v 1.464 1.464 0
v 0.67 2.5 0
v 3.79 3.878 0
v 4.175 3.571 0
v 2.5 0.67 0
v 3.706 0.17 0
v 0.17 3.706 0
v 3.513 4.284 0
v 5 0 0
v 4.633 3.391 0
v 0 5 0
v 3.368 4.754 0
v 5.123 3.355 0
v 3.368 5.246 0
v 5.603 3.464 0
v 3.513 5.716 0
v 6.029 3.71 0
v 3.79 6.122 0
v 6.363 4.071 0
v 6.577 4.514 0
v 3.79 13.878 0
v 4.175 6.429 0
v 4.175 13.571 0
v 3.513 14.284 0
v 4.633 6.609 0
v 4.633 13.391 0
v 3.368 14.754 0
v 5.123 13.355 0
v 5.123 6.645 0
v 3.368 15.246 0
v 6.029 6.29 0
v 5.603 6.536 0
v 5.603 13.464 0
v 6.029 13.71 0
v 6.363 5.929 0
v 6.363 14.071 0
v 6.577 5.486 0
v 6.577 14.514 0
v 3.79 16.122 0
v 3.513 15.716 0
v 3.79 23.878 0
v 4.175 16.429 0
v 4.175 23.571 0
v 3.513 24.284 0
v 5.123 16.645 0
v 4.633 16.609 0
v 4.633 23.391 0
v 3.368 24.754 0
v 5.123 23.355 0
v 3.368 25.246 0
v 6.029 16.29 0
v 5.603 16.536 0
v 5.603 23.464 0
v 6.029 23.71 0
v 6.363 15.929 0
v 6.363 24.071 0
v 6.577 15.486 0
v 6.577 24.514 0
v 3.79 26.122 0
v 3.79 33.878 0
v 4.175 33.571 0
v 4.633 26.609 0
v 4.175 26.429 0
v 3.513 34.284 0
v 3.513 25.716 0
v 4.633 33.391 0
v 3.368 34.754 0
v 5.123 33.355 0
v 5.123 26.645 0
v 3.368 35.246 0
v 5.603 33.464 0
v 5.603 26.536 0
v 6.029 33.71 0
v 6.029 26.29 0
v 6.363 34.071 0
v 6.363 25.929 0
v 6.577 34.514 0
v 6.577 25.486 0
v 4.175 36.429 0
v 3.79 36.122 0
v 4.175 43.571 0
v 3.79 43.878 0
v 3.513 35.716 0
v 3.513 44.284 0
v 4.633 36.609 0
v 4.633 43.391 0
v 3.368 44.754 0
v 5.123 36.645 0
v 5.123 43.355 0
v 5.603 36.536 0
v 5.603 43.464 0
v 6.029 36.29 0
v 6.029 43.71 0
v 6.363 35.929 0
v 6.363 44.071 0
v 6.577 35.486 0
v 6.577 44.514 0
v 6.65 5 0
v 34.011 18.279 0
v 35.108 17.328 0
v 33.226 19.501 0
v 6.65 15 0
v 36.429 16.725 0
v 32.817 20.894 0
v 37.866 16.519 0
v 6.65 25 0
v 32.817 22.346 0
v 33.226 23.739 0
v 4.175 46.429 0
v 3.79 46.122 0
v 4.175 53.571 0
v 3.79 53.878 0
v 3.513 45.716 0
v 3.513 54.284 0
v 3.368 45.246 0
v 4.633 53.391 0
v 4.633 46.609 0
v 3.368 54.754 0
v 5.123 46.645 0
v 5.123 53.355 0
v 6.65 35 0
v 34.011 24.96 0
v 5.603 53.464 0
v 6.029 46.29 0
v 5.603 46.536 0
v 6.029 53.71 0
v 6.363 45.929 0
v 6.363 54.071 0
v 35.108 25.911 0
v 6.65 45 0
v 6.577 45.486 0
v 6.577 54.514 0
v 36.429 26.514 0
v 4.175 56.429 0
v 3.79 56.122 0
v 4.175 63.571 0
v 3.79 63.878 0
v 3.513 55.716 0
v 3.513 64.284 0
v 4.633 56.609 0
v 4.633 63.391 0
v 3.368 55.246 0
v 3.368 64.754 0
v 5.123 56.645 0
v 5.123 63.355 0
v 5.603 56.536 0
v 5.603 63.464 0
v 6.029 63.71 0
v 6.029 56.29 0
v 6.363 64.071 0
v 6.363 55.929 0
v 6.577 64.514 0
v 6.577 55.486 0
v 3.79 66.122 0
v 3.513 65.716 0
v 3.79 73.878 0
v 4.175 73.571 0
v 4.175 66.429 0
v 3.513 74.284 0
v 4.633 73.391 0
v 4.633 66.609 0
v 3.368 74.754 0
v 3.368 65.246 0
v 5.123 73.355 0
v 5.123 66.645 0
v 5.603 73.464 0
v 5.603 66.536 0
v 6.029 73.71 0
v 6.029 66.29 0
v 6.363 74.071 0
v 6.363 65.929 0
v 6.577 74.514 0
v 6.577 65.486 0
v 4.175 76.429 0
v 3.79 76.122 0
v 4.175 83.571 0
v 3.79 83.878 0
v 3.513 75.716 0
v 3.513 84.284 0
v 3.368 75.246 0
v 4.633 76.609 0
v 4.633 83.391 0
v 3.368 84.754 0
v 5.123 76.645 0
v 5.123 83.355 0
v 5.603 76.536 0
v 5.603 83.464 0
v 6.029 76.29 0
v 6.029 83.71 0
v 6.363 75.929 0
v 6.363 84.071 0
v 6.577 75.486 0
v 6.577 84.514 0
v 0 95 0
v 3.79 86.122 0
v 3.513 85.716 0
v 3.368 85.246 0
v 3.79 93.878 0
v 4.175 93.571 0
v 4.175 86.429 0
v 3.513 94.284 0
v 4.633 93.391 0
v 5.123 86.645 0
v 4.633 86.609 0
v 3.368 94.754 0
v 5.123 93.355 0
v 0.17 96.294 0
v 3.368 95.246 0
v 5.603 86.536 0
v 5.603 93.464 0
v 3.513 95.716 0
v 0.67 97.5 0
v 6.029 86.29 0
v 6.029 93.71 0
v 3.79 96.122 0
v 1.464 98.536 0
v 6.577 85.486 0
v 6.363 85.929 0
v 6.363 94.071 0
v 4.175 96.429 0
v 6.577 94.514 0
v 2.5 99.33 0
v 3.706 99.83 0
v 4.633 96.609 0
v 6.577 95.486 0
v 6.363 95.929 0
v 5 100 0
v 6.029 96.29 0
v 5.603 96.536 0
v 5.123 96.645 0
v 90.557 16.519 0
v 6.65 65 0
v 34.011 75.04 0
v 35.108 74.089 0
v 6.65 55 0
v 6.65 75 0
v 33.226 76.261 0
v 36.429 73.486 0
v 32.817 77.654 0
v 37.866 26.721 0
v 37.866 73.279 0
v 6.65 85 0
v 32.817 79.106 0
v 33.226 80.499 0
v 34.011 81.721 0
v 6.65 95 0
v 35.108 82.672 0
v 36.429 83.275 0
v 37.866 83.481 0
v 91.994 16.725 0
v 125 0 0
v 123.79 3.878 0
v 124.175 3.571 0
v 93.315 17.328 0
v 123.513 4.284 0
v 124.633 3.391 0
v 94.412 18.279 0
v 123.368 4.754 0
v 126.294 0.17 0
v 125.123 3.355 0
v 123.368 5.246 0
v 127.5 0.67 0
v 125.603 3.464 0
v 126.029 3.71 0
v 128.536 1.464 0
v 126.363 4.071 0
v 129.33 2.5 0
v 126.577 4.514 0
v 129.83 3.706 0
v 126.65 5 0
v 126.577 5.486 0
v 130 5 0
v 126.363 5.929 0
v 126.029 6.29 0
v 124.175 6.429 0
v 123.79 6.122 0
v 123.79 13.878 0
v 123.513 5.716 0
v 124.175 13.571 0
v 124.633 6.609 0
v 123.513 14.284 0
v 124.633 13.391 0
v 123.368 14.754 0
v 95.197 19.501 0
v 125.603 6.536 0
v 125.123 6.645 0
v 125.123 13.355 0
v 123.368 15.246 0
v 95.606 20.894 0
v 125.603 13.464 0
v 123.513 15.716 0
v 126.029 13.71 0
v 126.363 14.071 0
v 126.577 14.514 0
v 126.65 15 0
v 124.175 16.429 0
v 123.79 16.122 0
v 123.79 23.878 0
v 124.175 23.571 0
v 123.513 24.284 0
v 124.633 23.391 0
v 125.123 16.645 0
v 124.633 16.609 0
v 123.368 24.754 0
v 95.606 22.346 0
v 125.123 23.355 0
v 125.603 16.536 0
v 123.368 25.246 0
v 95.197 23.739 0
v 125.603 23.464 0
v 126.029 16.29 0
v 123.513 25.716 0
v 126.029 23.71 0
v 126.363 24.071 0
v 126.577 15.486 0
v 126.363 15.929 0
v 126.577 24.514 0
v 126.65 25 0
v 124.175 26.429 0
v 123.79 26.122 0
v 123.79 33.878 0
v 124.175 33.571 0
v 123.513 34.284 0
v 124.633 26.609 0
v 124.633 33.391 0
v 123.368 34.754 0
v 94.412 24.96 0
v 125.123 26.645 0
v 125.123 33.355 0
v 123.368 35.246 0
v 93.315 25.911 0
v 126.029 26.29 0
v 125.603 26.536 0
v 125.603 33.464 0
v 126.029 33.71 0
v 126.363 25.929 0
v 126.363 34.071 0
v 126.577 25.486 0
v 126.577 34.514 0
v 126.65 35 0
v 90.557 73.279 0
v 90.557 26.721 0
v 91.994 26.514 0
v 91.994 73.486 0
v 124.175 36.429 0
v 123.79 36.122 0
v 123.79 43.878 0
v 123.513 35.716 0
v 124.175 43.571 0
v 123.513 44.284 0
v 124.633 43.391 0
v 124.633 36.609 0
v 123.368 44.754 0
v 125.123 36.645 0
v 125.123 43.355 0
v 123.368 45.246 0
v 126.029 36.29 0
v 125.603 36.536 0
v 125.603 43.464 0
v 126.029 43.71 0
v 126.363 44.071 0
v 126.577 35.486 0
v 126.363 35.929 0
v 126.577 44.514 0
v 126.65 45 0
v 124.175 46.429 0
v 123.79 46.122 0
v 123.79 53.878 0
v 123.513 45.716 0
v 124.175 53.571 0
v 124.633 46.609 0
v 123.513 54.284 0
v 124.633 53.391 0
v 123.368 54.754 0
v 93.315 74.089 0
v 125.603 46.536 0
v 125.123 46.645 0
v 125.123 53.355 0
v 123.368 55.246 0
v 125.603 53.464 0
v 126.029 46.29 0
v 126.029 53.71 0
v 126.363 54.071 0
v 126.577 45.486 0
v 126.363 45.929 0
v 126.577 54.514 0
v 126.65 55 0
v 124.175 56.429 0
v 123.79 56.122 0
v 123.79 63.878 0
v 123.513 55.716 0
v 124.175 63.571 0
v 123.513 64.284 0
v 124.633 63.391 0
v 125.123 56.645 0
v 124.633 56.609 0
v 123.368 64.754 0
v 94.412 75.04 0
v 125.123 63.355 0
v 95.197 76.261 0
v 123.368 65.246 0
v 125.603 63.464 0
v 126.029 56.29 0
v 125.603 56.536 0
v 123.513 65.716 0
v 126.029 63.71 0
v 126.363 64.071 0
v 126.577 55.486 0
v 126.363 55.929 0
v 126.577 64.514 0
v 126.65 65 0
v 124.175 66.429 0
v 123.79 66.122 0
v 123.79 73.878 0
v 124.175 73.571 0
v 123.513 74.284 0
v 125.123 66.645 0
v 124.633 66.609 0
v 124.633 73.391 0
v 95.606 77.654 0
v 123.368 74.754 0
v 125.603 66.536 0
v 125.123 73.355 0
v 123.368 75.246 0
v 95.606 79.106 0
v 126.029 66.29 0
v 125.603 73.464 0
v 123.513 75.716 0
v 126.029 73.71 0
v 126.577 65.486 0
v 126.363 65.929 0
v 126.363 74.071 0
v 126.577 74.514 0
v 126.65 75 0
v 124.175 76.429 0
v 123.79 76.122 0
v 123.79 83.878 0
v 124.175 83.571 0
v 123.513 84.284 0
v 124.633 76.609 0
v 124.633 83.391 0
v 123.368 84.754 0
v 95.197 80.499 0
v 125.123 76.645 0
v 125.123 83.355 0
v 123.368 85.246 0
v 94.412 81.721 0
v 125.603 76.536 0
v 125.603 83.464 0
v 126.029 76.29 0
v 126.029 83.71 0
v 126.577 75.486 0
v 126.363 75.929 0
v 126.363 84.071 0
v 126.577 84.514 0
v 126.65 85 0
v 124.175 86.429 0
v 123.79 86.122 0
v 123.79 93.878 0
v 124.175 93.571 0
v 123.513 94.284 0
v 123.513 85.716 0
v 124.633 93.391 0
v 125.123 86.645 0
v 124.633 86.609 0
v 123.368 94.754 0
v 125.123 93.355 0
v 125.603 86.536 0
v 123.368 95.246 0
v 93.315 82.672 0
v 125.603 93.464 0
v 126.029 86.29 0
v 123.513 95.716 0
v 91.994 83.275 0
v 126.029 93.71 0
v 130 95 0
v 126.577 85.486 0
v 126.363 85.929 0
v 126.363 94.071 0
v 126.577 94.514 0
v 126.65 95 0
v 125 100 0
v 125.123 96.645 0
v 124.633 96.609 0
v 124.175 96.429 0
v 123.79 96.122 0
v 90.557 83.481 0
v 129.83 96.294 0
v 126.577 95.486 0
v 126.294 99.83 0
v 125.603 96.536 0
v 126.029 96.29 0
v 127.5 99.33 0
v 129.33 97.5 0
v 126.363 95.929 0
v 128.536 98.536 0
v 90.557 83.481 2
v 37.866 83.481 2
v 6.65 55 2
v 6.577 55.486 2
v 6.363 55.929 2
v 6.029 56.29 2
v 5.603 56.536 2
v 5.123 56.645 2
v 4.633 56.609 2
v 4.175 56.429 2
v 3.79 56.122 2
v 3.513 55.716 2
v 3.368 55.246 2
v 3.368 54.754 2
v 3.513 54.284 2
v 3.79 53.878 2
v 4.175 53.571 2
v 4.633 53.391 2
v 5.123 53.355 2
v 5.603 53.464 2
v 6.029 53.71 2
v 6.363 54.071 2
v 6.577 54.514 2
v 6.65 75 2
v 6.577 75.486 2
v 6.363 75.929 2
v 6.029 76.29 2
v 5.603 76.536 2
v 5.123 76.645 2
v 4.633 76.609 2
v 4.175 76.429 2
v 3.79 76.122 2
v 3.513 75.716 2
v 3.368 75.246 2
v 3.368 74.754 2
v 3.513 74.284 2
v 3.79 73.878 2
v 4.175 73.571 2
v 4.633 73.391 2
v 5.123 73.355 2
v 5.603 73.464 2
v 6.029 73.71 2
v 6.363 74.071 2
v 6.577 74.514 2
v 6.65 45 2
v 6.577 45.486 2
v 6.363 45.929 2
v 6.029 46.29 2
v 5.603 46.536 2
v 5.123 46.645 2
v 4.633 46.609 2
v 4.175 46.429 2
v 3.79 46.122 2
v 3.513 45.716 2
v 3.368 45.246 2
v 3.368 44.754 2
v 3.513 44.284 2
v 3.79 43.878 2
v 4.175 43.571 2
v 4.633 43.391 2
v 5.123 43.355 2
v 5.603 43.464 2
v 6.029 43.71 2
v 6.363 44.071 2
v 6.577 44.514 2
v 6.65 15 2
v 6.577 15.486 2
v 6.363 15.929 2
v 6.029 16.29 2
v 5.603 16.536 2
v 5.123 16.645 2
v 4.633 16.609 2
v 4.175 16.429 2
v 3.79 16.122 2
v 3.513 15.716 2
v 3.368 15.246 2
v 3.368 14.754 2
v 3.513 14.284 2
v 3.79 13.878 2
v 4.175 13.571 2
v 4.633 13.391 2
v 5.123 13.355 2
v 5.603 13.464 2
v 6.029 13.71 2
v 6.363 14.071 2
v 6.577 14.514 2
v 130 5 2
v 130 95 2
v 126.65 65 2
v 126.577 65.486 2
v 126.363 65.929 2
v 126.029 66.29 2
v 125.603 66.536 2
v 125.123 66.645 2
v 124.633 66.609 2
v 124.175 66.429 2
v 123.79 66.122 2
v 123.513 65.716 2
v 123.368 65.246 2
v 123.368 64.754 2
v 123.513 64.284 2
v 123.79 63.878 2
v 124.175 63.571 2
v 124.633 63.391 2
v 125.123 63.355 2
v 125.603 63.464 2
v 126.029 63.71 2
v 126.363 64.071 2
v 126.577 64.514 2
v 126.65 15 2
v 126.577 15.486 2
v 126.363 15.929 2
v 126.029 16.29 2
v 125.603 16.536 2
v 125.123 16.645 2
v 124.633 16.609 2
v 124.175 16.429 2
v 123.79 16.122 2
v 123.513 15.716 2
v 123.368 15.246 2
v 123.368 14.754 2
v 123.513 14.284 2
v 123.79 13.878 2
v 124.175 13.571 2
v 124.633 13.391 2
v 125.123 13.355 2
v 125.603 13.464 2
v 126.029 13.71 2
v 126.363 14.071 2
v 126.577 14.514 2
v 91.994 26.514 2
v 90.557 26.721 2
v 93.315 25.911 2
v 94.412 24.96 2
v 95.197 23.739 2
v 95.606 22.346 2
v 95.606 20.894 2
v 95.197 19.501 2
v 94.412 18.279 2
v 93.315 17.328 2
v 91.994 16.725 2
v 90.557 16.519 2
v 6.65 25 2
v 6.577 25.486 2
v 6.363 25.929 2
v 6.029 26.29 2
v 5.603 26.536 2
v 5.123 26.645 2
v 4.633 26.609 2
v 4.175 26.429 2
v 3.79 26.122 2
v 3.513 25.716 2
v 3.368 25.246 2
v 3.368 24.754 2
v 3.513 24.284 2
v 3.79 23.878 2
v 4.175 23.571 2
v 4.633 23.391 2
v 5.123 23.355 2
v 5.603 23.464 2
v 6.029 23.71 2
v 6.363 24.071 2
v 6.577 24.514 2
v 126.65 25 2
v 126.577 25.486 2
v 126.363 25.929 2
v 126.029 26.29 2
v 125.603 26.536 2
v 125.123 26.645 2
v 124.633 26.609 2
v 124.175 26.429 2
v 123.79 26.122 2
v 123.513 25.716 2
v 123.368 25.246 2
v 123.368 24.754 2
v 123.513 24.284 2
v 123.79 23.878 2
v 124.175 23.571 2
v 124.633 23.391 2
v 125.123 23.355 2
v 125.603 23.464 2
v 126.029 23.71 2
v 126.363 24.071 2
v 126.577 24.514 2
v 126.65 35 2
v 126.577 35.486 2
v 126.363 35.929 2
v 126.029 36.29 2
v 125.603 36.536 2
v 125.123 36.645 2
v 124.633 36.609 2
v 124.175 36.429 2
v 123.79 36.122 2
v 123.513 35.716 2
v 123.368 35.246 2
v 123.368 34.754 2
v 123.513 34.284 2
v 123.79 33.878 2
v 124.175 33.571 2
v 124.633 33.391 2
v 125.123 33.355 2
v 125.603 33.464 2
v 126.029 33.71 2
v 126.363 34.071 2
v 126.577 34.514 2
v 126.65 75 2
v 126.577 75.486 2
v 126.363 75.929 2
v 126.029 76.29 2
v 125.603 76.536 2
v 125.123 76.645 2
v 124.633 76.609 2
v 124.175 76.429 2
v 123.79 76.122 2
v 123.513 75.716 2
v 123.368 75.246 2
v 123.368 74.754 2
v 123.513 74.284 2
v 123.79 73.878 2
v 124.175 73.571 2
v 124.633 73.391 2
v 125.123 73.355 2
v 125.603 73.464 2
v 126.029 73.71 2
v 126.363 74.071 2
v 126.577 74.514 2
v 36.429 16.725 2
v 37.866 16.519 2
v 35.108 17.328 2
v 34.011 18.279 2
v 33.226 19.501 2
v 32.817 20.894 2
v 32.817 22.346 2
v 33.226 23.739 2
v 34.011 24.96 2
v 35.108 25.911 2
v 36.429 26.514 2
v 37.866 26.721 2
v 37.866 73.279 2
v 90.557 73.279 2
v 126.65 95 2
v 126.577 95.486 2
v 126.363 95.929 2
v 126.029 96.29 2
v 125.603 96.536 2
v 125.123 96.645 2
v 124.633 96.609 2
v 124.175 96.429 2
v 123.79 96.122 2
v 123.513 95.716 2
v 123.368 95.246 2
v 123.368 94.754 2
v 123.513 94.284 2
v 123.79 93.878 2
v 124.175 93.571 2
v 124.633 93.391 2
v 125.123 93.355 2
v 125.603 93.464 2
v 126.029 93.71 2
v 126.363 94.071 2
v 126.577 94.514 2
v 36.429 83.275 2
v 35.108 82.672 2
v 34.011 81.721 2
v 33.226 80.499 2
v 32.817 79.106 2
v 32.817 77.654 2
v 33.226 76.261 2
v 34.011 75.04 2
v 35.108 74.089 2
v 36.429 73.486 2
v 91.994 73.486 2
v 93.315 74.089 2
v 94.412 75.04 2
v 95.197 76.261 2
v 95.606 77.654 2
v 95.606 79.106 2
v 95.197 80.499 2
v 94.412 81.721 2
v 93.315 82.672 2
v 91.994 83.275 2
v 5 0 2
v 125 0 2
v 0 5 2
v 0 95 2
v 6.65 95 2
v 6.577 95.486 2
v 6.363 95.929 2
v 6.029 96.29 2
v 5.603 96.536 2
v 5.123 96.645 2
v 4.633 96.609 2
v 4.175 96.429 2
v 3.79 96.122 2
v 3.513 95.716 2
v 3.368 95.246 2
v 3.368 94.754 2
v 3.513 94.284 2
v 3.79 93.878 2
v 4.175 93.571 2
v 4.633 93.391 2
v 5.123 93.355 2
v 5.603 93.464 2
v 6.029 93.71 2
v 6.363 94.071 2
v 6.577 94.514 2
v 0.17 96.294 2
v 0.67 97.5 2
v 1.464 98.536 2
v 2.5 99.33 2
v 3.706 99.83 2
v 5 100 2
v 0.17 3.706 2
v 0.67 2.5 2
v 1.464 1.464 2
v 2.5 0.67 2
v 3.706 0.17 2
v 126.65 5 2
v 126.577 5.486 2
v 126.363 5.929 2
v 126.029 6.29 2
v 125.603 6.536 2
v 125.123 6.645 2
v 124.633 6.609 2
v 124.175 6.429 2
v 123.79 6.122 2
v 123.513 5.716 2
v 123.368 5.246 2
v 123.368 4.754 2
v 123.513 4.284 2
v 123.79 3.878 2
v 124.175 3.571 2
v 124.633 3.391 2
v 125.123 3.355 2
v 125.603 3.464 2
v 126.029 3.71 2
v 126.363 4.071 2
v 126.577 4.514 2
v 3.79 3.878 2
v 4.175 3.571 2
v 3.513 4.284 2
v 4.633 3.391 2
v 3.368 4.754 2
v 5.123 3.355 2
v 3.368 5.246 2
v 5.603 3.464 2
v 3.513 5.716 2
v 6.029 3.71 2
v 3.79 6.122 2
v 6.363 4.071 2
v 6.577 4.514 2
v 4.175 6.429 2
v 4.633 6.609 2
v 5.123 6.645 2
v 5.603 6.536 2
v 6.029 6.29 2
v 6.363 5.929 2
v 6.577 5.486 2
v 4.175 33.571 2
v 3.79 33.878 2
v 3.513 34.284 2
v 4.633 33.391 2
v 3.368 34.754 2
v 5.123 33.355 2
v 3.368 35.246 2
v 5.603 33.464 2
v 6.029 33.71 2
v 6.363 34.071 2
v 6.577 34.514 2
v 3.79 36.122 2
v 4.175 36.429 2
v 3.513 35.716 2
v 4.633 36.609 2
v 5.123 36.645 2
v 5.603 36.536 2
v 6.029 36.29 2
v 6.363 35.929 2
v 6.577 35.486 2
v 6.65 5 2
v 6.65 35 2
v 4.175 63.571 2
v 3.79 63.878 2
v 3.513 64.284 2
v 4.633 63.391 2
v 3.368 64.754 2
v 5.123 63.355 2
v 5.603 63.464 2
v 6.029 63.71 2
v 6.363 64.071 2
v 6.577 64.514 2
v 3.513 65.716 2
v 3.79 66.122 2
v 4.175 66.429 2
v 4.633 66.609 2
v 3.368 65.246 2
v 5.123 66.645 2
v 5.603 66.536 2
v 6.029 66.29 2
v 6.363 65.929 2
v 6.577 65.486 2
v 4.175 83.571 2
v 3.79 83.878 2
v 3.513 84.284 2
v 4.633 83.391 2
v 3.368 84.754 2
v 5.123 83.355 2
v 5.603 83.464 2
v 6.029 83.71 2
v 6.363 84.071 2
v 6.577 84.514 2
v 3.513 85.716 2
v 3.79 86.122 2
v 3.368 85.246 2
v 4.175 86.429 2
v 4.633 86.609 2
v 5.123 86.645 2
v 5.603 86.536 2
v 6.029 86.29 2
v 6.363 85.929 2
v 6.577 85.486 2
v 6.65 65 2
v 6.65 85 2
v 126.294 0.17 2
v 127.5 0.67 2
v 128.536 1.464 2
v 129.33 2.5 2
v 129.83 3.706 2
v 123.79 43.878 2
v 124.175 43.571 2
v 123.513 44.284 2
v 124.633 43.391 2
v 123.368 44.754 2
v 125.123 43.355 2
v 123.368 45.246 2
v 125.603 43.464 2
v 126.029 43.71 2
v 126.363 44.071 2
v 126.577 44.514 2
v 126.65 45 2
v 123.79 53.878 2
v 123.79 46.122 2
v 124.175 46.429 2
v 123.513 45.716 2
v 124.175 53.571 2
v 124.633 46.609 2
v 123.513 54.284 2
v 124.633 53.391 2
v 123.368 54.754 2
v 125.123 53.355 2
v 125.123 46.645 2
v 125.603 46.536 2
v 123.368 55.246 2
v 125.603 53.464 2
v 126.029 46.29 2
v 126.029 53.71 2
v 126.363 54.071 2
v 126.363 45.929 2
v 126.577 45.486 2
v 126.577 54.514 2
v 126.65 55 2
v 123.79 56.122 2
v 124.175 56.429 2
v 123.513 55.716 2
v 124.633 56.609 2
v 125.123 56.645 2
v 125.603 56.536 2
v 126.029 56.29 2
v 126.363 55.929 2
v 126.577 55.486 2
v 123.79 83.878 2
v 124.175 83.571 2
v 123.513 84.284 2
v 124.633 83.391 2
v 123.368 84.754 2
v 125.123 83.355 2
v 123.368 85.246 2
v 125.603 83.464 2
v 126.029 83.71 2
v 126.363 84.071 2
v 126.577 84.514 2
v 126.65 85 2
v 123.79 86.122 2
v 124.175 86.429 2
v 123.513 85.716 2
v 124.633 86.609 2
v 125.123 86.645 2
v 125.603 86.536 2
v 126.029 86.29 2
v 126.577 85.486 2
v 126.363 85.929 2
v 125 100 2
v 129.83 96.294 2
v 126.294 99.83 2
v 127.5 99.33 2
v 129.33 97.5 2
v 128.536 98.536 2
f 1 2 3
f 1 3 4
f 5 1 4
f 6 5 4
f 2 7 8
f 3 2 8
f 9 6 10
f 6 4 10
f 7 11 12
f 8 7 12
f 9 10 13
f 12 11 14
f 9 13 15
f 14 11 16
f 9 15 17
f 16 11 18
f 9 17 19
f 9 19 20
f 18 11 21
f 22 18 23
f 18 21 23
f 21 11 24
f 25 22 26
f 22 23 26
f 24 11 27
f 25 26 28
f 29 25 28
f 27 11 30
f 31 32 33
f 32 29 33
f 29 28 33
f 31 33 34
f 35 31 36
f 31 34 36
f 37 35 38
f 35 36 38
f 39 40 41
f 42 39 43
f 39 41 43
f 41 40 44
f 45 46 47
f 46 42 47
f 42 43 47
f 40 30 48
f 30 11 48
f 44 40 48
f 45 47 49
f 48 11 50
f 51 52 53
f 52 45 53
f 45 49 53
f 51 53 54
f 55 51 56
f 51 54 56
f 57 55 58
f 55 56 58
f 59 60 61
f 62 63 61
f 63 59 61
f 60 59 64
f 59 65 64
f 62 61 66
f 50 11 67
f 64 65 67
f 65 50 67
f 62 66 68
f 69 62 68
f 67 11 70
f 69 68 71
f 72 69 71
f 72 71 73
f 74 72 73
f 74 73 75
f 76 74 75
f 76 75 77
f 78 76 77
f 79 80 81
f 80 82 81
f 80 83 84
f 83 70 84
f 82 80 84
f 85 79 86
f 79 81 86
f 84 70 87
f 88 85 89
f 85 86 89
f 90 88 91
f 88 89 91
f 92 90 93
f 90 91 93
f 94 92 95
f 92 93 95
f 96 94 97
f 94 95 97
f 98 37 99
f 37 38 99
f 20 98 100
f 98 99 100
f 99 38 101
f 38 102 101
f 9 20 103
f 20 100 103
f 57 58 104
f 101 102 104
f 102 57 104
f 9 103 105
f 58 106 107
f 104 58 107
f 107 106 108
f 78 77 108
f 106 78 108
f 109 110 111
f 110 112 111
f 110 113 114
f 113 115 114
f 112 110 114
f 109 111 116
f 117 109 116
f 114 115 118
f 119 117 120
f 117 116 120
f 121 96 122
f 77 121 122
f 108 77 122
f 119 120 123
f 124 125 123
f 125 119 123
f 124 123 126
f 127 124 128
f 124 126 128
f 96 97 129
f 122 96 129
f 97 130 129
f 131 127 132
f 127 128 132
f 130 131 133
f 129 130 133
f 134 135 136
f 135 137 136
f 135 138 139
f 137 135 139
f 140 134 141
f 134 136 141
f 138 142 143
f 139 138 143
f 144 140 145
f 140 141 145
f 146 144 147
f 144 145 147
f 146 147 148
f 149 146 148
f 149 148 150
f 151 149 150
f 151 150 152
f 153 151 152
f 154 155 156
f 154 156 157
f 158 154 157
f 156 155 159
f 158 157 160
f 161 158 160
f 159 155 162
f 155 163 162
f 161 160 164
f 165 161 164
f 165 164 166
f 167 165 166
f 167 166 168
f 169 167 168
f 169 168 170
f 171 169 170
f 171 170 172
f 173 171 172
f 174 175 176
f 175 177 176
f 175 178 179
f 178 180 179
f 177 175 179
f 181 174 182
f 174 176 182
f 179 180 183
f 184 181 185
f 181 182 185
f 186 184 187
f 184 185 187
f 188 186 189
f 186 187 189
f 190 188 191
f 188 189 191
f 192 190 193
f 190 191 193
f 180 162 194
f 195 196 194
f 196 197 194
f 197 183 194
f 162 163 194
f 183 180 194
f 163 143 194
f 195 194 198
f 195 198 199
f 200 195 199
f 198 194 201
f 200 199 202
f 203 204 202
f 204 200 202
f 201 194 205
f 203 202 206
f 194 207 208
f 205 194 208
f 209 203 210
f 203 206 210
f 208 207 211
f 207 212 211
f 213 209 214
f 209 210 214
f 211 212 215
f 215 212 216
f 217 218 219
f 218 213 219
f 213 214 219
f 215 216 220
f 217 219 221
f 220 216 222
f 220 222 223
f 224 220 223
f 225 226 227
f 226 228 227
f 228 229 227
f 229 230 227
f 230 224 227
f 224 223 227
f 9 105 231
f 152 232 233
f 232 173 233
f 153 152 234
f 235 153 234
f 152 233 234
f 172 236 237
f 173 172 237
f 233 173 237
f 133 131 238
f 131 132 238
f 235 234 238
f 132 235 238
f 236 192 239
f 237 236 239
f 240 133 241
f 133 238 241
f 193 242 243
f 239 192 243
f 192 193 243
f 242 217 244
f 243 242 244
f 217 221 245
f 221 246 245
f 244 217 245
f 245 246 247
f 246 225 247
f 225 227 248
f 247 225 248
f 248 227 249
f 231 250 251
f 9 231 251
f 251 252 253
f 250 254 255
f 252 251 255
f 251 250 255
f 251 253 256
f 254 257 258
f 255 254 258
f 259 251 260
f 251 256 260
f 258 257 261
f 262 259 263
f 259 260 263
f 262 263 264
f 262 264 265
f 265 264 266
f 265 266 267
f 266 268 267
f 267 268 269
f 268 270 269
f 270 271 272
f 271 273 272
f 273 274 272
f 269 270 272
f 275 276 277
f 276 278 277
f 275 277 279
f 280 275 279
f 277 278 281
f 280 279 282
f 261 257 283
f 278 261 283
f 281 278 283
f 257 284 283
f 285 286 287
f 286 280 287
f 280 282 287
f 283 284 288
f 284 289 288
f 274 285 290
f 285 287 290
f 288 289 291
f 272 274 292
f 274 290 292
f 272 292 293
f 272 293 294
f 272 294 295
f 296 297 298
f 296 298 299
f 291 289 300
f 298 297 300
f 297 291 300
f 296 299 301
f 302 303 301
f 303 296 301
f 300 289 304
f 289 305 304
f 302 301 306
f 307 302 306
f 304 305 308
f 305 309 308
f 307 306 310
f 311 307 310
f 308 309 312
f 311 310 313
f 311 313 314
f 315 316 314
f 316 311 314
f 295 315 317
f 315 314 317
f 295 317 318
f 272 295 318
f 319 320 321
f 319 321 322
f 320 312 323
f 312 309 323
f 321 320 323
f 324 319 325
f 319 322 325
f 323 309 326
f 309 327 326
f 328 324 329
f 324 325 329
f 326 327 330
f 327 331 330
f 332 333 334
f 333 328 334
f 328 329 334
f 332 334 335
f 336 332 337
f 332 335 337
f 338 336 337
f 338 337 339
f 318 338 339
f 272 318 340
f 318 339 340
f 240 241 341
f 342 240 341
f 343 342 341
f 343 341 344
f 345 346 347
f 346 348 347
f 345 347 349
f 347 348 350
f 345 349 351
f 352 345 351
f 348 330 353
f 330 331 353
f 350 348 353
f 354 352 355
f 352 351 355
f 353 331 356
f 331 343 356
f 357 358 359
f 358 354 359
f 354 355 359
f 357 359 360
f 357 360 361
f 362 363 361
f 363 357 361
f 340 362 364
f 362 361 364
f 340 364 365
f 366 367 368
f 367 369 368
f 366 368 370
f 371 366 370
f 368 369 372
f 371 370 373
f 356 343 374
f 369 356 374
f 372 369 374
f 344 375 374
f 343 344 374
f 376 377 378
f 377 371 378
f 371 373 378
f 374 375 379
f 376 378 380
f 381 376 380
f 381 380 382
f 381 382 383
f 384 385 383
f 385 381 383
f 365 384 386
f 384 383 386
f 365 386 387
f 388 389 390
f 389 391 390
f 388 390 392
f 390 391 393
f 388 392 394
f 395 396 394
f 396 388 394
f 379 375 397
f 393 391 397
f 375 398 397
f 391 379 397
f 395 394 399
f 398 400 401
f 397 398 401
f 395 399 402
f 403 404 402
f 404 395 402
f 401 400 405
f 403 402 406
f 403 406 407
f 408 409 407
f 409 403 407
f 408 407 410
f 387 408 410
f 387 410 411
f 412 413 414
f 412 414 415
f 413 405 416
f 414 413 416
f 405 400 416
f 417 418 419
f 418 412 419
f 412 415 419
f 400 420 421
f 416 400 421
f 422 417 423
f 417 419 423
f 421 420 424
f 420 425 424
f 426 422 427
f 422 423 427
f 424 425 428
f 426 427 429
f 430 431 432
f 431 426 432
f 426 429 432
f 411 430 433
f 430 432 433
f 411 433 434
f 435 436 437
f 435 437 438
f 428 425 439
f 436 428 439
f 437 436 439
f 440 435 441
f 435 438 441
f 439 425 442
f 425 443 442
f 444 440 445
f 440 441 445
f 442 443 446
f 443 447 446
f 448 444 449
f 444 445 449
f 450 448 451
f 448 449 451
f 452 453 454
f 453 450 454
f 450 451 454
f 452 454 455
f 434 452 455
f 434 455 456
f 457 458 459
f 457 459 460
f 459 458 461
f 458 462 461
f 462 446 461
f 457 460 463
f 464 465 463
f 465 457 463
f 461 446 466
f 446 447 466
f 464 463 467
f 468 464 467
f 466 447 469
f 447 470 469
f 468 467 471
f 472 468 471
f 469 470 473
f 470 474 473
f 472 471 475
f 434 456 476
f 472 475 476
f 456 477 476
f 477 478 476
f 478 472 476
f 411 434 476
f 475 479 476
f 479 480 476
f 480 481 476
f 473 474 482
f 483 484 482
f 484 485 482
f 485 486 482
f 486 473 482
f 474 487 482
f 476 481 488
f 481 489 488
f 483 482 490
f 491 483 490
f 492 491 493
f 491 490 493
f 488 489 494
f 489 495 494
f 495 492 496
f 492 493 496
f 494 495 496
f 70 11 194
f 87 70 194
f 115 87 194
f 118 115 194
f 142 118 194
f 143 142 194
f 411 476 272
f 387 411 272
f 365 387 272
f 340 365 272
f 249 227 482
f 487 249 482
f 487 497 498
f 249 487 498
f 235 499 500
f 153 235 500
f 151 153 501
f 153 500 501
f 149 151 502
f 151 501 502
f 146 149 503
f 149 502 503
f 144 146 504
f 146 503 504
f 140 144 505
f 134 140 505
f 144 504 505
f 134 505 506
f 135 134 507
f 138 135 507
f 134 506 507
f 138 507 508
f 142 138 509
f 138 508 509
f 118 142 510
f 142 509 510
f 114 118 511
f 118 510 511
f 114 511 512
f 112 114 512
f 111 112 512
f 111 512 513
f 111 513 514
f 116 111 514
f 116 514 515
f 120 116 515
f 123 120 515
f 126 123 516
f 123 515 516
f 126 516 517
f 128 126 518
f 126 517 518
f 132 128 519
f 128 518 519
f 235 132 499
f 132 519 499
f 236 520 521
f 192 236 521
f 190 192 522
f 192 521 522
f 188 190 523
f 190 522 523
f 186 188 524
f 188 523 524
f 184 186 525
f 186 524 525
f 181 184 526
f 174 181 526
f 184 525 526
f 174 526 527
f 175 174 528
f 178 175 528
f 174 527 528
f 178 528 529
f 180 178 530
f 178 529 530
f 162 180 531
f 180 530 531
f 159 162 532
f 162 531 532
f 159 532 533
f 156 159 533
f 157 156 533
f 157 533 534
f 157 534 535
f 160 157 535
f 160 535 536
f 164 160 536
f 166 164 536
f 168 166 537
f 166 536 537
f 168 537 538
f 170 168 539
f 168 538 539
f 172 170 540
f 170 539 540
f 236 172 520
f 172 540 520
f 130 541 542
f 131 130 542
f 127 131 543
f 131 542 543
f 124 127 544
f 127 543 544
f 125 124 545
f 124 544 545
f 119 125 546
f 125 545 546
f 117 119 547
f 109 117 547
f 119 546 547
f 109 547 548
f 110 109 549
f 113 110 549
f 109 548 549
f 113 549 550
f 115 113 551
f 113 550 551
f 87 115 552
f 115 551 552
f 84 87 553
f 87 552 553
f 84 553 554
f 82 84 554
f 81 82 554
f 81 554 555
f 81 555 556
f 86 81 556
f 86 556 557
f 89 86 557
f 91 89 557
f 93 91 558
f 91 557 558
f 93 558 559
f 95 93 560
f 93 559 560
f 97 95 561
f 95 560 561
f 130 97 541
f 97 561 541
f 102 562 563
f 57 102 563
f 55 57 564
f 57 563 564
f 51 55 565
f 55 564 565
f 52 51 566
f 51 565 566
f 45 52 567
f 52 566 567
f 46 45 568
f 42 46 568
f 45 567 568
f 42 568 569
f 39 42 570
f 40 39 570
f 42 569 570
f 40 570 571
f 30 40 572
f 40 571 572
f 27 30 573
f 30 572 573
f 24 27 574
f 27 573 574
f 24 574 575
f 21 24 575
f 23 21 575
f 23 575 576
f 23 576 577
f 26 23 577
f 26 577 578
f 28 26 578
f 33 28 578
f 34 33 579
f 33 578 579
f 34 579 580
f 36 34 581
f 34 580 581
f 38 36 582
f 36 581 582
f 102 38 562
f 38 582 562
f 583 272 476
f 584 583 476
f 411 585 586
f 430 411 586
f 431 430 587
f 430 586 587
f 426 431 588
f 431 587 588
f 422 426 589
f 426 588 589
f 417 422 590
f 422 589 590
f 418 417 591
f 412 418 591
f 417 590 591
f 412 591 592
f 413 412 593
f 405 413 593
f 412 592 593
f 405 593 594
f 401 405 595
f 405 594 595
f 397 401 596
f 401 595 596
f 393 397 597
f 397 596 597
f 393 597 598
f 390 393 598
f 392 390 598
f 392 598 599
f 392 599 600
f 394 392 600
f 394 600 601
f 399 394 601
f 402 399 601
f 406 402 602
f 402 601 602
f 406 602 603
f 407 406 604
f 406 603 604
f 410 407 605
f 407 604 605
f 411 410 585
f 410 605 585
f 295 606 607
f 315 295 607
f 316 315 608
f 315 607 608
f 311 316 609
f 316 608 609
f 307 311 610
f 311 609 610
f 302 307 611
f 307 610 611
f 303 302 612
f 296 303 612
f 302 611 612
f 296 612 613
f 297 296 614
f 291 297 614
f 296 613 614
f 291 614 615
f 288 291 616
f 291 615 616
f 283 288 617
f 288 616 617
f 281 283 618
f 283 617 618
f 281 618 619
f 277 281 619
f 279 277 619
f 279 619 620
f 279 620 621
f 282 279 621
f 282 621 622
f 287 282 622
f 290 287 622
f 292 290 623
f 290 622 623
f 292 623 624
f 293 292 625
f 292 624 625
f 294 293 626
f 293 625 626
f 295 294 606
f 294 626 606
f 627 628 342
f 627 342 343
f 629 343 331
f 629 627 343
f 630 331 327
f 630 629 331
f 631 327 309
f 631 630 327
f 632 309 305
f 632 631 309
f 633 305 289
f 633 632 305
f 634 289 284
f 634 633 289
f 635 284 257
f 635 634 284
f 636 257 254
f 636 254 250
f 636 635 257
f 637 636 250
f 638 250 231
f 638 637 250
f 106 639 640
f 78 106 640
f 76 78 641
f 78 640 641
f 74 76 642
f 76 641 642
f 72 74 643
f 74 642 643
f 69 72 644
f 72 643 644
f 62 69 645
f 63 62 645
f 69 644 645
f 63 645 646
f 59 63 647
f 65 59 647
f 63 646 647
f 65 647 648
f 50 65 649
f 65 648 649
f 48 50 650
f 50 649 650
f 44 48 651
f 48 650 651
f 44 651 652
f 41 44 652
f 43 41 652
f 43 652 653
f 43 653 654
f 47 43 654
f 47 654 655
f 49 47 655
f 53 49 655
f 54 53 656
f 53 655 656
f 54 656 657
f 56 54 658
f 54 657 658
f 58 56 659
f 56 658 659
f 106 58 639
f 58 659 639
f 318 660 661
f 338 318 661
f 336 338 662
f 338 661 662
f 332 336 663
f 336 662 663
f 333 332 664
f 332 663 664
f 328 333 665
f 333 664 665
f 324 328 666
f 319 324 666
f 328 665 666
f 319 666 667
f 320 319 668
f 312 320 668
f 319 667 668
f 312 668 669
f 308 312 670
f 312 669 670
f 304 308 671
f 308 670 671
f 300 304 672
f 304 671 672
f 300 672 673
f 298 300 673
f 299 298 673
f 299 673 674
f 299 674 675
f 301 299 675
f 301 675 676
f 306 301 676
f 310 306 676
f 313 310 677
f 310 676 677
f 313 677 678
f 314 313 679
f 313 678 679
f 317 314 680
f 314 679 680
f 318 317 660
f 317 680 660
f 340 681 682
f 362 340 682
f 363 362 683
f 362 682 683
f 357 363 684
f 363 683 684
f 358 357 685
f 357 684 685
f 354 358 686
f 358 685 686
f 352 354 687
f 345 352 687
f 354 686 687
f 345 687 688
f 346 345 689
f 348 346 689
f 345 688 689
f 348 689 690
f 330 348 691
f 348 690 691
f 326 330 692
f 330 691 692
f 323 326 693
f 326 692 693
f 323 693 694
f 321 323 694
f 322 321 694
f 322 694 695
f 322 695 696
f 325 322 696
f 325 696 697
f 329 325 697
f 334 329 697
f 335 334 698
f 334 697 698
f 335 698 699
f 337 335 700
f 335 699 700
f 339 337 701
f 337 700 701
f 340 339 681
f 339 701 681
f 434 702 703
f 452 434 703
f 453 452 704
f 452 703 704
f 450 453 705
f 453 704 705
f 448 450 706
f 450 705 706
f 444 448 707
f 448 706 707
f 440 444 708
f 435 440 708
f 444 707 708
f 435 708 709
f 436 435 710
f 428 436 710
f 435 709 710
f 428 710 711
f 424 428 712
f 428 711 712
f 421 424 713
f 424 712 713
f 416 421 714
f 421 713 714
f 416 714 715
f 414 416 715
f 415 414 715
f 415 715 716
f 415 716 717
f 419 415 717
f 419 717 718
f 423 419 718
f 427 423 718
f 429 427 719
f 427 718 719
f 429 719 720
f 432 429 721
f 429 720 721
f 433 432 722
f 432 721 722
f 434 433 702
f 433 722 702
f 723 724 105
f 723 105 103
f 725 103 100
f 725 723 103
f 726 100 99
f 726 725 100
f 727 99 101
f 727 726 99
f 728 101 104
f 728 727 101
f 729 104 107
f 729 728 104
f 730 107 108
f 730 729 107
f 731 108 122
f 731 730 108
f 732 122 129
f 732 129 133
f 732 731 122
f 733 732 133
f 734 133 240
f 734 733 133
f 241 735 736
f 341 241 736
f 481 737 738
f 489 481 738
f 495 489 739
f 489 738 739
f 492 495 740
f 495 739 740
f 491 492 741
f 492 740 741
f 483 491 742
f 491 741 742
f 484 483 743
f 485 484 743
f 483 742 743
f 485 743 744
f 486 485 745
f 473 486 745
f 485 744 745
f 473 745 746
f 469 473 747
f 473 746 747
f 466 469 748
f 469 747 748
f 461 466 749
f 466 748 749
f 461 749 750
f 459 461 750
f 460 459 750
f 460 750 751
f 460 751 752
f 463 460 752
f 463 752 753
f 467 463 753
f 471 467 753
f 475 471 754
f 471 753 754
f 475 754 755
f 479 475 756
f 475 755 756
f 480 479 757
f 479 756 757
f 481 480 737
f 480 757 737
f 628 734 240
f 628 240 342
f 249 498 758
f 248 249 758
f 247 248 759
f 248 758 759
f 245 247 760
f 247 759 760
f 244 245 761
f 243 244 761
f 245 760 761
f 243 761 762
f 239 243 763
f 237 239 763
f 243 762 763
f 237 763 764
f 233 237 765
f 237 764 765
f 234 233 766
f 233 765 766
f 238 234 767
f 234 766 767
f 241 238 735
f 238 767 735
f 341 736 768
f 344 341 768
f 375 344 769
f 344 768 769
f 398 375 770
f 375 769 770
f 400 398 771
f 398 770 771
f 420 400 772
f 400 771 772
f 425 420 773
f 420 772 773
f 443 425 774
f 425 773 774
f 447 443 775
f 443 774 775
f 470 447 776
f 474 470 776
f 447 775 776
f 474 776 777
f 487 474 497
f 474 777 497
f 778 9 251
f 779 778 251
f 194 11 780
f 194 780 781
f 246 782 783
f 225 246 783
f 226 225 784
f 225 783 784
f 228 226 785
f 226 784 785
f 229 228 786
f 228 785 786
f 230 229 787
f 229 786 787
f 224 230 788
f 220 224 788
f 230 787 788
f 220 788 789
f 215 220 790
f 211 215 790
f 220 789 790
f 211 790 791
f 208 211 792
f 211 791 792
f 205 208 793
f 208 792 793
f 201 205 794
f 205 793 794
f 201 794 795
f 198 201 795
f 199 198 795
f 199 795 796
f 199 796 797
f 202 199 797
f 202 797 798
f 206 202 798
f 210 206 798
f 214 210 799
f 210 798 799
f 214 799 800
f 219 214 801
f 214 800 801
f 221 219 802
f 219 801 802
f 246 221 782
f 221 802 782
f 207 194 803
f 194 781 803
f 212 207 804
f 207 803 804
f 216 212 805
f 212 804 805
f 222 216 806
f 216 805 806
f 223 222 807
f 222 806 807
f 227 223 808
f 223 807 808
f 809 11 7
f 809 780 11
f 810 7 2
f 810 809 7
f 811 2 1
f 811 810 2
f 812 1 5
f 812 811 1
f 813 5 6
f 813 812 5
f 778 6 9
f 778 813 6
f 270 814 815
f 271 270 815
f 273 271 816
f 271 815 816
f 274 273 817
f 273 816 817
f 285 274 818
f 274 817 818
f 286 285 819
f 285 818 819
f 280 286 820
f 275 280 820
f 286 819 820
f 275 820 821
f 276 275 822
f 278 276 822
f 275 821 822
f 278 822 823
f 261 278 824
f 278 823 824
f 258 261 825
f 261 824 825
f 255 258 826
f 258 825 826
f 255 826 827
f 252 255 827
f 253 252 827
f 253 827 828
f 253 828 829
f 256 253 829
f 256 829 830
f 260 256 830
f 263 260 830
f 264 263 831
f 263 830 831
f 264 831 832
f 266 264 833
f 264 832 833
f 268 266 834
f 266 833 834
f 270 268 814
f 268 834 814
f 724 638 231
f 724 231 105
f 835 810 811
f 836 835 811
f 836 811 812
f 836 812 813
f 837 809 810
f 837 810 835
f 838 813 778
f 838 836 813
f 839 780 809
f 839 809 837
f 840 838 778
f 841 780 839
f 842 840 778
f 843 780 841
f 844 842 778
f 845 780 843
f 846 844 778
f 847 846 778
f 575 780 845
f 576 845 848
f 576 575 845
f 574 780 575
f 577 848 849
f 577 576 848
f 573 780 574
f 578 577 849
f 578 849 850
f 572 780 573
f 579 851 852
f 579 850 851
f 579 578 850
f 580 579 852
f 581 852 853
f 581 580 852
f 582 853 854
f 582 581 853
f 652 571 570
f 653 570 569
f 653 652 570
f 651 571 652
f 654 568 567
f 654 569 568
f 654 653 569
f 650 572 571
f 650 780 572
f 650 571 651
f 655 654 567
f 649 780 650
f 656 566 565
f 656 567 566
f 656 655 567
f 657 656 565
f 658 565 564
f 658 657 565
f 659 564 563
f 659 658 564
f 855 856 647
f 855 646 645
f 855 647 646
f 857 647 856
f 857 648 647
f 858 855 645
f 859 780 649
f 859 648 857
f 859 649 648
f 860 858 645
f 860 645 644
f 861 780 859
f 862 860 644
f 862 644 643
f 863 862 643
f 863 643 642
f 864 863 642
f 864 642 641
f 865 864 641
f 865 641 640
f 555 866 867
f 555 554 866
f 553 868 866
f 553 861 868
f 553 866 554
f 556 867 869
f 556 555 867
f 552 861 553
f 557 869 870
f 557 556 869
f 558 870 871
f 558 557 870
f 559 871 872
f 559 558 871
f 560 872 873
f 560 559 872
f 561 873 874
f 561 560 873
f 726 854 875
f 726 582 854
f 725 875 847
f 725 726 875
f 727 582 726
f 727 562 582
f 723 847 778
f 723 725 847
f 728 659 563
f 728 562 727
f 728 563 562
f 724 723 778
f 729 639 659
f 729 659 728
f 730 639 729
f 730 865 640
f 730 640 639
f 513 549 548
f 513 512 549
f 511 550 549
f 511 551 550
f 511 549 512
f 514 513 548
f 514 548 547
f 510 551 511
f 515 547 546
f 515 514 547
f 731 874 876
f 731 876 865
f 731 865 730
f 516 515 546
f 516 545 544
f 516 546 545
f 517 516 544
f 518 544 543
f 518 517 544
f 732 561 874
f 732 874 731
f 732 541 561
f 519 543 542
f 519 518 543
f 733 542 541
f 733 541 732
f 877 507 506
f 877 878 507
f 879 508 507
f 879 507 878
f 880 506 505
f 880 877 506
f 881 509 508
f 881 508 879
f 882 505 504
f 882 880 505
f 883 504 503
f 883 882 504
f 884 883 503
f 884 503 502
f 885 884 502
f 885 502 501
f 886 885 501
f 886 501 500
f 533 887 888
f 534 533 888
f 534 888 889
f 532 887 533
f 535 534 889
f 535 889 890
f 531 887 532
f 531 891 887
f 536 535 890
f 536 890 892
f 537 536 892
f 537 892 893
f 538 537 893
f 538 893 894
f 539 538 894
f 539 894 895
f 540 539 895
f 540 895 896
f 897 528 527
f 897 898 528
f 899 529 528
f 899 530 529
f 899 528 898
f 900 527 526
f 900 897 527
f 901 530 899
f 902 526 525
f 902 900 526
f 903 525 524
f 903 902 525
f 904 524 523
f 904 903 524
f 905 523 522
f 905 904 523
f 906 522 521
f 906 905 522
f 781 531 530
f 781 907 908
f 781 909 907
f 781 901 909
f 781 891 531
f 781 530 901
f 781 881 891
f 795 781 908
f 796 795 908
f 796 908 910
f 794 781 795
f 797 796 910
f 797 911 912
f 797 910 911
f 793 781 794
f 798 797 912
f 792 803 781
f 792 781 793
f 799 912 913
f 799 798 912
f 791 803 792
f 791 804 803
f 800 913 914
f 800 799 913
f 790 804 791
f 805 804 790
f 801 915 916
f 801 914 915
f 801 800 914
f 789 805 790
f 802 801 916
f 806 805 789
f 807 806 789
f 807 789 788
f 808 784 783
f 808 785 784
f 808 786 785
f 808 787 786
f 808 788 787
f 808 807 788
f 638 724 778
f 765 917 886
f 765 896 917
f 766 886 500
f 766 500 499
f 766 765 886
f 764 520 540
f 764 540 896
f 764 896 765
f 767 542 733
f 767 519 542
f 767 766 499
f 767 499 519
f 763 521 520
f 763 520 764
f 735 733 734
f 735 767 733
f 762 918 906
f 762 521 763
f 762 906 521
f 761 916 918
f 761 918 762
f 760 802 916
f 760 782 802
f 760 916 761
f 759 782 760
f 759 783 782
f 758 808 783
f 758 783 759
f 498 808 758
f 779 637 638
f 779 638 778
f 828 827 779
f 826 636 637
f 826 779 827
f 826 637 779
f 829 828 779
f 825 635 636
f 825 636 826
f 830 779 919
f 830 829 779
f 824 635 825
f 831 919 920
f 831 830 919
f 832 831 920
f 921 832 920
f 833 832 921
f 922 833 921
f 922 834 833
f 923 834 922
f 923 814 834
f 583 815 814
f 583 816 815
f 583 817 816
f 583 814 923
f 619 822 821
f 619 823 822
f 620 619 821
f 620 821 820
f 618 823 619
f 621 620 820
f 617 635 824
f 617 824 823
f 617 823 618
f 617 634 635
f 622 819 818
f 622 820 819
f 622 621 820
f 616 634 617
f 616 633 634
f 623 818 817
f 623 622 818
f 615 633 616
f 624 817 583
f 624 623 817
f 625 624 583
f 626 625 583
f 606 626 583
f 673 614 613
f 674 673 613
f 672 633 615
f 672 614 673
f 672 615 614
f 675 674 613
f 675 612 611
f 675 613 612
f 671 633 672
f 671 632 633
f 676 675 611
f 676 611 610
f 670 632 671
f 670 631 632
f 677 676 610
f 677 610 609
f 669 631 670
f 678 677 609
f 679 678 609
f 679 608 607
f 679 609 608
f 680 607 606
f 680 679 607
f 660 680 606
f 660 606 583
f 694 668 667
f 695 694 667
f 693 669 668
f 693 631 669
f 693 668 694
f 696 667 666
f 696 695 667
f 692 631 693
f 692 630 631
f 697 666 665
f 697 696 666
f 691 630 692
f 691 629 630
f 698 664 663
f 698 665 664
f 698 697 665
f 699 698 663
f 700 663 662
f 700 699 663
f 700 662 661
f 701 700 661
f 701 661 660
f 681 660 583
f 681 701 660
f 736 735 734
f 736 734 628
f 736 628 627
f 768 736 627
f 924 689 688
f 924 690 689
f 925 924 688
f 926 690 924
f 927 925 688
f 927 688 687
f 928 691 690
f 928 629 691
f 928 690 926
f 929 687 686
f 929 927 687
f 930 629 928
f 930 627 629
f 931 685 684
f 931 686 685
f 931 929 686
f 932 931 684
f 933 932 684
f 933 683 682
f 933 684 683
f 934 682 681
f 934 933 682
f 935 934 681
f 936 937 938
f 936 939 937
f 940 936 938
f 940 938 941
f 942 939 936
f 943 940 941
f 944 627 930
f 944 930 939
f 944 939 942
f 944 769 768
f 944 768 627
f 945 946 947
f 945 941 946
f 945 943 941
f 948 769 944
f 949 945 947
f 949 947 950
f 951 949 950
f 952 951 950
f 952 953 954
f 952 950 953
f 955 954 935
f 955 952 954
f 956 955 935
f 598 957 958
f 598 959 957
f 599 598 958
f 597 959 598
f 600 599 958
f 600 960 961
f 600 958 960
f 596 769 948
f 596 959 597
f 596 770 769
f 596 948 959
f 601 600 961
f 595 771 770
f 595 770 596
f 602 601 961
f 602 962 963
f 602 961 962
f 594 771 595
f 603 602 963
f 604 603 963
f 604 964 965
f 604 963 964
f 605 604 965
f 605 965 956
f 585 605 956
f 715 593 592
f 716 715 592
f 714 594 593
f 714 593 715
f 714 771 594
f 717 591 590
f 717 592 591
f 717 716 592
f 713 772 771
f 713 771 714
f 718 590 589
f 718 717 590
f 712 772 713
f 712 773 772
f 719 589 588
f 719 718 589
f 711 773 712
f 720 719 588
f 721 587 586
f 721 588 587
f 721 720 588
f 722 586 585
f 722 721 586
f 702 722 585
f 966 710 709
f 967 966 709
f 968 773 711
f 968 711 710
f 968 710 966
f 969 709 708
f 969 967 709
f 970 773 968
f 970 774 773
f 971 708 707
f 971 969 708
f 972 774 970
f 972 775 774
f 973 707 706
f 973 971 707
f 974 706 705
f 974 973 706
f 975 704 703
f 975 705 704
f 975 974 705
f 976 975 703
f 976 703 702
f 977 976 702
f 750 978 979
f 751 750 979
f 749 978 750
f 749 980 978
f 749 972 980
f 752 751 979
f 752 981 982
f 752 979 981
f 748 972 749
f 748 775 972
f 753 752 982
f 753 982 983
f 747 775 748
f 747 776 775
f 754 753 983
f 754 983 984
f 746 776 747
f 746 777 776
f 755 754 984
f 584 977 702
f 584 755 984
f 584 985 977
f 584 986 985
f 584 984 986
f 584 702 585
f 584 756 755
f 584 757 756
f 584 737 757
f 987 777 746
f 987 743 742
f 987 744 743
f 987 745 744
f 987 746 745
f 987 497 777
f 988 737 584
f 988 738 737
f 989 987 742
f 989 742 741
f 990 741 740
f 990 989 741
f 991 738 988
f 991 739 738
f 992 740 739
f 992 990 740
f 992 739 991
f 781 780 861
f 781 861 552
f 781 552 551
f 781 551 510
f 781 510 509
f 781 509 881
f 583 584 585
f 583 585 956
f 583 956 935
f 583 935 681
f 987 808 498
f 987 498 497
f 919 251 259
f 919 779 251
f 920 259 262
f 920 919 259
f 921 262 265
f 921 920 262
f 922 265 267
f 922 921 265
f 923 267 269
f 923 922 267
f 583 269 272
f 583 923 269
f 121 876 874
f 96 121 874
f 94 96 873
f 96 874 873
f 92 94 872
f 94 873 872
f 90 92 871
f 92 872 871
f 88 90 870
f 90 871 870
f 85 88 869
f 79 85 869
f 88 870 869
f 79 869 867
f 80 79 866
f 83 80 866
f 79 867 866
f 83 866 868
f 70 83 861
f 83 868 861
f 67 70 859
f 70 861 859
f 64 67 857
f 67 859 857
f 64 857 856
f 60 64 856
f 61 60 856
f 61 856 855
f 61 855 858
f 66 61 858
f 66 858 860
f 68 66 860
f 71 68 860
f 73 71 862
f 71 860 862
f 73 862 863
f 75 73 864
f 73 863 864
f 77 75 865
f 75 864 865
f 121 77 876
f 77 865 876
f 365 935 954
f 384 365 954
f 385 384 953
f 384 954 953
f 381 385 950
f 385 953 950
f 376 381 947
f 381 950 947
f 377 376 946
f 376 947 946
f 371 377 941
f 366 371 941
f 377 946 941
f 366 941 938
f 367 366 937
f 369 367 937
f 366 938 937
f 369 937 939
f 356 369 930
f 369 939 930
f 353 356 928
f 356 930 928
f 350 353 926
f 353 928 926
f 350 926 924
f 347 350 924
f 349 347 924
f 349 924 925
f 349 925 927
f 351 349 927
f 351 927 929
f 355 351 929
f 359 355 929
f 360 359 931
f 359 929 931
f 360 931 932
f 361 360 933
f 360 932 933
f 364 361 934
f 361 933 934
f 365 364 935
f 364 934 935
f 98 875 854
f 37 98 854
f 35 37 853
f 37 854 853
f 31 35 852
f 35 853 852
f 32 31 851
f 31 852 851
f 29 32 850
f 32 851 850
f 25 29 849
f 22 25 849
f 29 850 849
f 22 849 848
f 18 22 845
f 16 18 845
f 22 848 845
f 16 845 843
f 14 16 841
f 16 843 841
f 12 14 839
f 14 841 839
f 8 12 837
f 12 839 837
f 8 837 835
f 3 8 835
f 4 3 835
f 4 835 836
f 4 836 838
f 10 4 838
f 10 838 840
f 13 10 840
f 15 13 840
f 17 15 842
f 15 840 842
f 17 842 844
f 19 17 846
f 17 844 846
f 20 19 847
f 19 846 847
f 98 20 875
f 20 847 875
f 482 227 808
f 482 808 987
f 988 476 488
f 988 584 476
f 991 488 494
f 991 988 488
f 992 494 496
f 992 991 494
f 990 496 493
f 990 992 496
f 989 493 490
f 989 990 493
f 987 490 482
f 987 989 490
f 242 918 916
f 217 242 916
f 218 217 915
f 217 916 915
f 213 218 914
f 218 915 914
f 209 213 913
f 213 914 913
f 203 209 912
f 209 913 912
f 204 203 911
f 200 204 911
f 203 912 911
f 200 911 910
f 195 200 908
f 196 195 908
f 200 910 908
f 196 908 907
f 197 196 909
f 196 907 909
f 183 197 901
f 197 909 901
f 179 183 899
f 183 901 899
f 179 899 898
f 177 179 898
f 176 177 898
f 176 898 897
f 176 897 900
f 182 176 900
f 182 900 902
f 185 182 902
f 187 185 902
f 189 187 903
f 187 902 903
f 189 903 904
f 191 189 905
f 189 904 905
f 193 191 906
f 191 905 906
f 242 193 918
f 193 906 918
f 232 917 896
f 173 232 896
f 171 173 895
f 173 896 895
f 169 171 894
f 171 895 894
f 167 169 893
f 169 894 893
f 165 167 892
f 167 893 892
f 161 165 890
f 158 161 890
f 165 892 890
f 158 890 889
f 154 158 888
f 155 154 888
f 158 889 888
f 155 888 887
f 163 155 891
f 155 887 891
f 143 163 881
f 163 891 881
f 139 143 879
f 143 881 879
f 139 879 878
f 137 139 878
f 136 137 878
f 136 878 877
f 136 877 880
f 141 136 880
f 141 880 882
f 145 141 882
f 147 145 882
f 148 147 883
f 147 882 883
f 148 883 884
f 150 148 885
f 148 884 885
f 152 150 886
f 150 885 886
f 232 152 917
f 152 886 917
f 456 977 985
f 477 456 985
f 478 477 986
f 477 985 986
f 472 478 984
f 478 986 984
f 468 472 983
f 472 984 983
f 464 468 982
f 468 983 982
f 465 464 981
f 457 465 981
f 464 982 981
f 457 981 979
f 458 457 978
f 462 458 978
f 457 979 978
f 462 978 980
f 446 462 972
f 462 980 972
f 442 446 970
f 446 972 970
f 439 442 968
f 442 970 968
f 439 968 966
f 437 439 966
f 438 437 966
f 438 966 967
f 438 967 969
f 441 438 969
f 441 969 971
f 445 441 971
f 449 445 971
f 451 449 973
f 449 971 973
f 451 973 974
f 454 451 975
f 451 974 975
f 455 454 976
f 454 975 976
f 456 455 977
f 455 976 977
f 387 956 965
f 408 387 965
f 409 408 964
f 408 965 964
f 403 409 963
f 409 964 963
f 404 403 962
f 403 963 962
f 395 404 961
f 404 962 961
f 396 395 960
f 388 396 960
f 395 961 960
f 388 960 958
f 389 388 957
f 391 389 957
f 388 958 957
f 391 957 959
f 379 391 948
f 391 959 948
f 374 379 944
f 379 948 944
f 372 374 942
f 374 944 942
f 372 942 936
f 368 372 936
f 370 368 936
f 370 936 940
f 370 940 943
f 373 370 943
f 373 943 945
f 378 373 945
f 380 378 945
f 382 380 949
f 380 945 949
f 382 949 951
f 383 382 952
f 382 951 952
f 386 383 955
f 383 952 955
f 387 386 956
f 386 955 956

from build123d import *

# Parameters (mm, degrees)
SKETCH_1_W                  = 130
SKETCH_1_H                  = 100
EXTRUDE_1_DEPTH             = 2
FILLET_1_R                  = 5
SKETCH_2_R                  = 1.65
CUT_EXTRUDE_1_DEPTH         = 2
PATTERN_LINEAR_1_COUNT      = 2
PATTERN_LINEAR_1_PITCH      = 120
PATTERN_LINEAR_1_COUNT_DIR2 = 10
PATTERN_LINEAR_1_PITCH_DIR2 = 10
CUT_EXTRUDE_2_DEPTH         = 2


with BuildPart() as part:
    # 草图1 → 凸台-拉伸1 (new body)
    with BuildSketch(Plane.XY):
        with Locations((65, 50)):
            Rectangle(SKETCH_1_W, SKETCH_1_H)
    extrude(amount=EXTRUDE_1_DEPTH)

    # 圆角1
    fillet_1_edges = [part.edges().sort_by_distance(p)[0] for p in [
        (0, 100, 1),
        (130, 100, 1),
        (130, 0, 1),
        (0, 0, 1),
    ]]
    fillet(fillet_1_edges, radius=FILLET_1_R)

    # 草图2 → 切除-拉伸1 (cut)
    with BuildSketch(Plane.XY.offset(2)):
        with Locations((5, 95)):
            Circle(SKETCH_2_R)
    cut_extrude_1 = extrude(amount=-CUT_EXTRUDE_1_DEPTH, mode=Mode.SUBTRACT)

    # 阵列(线性)1: Cut-Extrude 1 2 × 10
    with Locations(*[(i * PATTERN_LINEAR_1_PITCH, -j * PATTERN_LINEAR_1_PITCH_DIR2, 0) for i in range(PATTERN_LINEAR_1_COUNT) for j in range(PATTERN_LINEAR_1_COUNT_DIR2) if (i, j) != (0, 0)]):
        add(cut_extrude_1, mode=Mode.SUBTRACT)

    # 草图3 → 切除-拉伸2 (cut)
    with BuildSketch(Plane.XY.offset(2)):
        with BuildLine():
            Line((37.866154951, 73.279191598), (90.557089201, 73.279191598))
            ThreePointArc((90.557089201, 73.279191598), (95.658146272, 78.380248669), (90.557089201, 83.48130574))
            Line((90.557089201, 83.48130574), (37.866154951, 83.48130574))
            ThreePointArc((37.866154951, 83.48130574), (32.76509788, 78.380248669), (37.866154951, 73.279191598))
        make_face()
        with BuildLine():
            ThreePointArc((90.557089201, 26.720808402), (95.658146272, 21.619751331), (90.557089201, 16.51869426))
            Line((90.557089201, 16.51869426), (37.866154951, 16.51869426))
            ThreePointArc((37.866154951, 16.51869426), (32.76509788, 21.619751331), (37.866154951, 26.720808402))
            Line((37.866154951, 26.720808402), (90.557089201, 26.720808402))
        make_face()
    extrude(amount=-CUT_EXTRUDE_2_DEPTH, mode=Mode.SUBTRACT)


solid = part.part
